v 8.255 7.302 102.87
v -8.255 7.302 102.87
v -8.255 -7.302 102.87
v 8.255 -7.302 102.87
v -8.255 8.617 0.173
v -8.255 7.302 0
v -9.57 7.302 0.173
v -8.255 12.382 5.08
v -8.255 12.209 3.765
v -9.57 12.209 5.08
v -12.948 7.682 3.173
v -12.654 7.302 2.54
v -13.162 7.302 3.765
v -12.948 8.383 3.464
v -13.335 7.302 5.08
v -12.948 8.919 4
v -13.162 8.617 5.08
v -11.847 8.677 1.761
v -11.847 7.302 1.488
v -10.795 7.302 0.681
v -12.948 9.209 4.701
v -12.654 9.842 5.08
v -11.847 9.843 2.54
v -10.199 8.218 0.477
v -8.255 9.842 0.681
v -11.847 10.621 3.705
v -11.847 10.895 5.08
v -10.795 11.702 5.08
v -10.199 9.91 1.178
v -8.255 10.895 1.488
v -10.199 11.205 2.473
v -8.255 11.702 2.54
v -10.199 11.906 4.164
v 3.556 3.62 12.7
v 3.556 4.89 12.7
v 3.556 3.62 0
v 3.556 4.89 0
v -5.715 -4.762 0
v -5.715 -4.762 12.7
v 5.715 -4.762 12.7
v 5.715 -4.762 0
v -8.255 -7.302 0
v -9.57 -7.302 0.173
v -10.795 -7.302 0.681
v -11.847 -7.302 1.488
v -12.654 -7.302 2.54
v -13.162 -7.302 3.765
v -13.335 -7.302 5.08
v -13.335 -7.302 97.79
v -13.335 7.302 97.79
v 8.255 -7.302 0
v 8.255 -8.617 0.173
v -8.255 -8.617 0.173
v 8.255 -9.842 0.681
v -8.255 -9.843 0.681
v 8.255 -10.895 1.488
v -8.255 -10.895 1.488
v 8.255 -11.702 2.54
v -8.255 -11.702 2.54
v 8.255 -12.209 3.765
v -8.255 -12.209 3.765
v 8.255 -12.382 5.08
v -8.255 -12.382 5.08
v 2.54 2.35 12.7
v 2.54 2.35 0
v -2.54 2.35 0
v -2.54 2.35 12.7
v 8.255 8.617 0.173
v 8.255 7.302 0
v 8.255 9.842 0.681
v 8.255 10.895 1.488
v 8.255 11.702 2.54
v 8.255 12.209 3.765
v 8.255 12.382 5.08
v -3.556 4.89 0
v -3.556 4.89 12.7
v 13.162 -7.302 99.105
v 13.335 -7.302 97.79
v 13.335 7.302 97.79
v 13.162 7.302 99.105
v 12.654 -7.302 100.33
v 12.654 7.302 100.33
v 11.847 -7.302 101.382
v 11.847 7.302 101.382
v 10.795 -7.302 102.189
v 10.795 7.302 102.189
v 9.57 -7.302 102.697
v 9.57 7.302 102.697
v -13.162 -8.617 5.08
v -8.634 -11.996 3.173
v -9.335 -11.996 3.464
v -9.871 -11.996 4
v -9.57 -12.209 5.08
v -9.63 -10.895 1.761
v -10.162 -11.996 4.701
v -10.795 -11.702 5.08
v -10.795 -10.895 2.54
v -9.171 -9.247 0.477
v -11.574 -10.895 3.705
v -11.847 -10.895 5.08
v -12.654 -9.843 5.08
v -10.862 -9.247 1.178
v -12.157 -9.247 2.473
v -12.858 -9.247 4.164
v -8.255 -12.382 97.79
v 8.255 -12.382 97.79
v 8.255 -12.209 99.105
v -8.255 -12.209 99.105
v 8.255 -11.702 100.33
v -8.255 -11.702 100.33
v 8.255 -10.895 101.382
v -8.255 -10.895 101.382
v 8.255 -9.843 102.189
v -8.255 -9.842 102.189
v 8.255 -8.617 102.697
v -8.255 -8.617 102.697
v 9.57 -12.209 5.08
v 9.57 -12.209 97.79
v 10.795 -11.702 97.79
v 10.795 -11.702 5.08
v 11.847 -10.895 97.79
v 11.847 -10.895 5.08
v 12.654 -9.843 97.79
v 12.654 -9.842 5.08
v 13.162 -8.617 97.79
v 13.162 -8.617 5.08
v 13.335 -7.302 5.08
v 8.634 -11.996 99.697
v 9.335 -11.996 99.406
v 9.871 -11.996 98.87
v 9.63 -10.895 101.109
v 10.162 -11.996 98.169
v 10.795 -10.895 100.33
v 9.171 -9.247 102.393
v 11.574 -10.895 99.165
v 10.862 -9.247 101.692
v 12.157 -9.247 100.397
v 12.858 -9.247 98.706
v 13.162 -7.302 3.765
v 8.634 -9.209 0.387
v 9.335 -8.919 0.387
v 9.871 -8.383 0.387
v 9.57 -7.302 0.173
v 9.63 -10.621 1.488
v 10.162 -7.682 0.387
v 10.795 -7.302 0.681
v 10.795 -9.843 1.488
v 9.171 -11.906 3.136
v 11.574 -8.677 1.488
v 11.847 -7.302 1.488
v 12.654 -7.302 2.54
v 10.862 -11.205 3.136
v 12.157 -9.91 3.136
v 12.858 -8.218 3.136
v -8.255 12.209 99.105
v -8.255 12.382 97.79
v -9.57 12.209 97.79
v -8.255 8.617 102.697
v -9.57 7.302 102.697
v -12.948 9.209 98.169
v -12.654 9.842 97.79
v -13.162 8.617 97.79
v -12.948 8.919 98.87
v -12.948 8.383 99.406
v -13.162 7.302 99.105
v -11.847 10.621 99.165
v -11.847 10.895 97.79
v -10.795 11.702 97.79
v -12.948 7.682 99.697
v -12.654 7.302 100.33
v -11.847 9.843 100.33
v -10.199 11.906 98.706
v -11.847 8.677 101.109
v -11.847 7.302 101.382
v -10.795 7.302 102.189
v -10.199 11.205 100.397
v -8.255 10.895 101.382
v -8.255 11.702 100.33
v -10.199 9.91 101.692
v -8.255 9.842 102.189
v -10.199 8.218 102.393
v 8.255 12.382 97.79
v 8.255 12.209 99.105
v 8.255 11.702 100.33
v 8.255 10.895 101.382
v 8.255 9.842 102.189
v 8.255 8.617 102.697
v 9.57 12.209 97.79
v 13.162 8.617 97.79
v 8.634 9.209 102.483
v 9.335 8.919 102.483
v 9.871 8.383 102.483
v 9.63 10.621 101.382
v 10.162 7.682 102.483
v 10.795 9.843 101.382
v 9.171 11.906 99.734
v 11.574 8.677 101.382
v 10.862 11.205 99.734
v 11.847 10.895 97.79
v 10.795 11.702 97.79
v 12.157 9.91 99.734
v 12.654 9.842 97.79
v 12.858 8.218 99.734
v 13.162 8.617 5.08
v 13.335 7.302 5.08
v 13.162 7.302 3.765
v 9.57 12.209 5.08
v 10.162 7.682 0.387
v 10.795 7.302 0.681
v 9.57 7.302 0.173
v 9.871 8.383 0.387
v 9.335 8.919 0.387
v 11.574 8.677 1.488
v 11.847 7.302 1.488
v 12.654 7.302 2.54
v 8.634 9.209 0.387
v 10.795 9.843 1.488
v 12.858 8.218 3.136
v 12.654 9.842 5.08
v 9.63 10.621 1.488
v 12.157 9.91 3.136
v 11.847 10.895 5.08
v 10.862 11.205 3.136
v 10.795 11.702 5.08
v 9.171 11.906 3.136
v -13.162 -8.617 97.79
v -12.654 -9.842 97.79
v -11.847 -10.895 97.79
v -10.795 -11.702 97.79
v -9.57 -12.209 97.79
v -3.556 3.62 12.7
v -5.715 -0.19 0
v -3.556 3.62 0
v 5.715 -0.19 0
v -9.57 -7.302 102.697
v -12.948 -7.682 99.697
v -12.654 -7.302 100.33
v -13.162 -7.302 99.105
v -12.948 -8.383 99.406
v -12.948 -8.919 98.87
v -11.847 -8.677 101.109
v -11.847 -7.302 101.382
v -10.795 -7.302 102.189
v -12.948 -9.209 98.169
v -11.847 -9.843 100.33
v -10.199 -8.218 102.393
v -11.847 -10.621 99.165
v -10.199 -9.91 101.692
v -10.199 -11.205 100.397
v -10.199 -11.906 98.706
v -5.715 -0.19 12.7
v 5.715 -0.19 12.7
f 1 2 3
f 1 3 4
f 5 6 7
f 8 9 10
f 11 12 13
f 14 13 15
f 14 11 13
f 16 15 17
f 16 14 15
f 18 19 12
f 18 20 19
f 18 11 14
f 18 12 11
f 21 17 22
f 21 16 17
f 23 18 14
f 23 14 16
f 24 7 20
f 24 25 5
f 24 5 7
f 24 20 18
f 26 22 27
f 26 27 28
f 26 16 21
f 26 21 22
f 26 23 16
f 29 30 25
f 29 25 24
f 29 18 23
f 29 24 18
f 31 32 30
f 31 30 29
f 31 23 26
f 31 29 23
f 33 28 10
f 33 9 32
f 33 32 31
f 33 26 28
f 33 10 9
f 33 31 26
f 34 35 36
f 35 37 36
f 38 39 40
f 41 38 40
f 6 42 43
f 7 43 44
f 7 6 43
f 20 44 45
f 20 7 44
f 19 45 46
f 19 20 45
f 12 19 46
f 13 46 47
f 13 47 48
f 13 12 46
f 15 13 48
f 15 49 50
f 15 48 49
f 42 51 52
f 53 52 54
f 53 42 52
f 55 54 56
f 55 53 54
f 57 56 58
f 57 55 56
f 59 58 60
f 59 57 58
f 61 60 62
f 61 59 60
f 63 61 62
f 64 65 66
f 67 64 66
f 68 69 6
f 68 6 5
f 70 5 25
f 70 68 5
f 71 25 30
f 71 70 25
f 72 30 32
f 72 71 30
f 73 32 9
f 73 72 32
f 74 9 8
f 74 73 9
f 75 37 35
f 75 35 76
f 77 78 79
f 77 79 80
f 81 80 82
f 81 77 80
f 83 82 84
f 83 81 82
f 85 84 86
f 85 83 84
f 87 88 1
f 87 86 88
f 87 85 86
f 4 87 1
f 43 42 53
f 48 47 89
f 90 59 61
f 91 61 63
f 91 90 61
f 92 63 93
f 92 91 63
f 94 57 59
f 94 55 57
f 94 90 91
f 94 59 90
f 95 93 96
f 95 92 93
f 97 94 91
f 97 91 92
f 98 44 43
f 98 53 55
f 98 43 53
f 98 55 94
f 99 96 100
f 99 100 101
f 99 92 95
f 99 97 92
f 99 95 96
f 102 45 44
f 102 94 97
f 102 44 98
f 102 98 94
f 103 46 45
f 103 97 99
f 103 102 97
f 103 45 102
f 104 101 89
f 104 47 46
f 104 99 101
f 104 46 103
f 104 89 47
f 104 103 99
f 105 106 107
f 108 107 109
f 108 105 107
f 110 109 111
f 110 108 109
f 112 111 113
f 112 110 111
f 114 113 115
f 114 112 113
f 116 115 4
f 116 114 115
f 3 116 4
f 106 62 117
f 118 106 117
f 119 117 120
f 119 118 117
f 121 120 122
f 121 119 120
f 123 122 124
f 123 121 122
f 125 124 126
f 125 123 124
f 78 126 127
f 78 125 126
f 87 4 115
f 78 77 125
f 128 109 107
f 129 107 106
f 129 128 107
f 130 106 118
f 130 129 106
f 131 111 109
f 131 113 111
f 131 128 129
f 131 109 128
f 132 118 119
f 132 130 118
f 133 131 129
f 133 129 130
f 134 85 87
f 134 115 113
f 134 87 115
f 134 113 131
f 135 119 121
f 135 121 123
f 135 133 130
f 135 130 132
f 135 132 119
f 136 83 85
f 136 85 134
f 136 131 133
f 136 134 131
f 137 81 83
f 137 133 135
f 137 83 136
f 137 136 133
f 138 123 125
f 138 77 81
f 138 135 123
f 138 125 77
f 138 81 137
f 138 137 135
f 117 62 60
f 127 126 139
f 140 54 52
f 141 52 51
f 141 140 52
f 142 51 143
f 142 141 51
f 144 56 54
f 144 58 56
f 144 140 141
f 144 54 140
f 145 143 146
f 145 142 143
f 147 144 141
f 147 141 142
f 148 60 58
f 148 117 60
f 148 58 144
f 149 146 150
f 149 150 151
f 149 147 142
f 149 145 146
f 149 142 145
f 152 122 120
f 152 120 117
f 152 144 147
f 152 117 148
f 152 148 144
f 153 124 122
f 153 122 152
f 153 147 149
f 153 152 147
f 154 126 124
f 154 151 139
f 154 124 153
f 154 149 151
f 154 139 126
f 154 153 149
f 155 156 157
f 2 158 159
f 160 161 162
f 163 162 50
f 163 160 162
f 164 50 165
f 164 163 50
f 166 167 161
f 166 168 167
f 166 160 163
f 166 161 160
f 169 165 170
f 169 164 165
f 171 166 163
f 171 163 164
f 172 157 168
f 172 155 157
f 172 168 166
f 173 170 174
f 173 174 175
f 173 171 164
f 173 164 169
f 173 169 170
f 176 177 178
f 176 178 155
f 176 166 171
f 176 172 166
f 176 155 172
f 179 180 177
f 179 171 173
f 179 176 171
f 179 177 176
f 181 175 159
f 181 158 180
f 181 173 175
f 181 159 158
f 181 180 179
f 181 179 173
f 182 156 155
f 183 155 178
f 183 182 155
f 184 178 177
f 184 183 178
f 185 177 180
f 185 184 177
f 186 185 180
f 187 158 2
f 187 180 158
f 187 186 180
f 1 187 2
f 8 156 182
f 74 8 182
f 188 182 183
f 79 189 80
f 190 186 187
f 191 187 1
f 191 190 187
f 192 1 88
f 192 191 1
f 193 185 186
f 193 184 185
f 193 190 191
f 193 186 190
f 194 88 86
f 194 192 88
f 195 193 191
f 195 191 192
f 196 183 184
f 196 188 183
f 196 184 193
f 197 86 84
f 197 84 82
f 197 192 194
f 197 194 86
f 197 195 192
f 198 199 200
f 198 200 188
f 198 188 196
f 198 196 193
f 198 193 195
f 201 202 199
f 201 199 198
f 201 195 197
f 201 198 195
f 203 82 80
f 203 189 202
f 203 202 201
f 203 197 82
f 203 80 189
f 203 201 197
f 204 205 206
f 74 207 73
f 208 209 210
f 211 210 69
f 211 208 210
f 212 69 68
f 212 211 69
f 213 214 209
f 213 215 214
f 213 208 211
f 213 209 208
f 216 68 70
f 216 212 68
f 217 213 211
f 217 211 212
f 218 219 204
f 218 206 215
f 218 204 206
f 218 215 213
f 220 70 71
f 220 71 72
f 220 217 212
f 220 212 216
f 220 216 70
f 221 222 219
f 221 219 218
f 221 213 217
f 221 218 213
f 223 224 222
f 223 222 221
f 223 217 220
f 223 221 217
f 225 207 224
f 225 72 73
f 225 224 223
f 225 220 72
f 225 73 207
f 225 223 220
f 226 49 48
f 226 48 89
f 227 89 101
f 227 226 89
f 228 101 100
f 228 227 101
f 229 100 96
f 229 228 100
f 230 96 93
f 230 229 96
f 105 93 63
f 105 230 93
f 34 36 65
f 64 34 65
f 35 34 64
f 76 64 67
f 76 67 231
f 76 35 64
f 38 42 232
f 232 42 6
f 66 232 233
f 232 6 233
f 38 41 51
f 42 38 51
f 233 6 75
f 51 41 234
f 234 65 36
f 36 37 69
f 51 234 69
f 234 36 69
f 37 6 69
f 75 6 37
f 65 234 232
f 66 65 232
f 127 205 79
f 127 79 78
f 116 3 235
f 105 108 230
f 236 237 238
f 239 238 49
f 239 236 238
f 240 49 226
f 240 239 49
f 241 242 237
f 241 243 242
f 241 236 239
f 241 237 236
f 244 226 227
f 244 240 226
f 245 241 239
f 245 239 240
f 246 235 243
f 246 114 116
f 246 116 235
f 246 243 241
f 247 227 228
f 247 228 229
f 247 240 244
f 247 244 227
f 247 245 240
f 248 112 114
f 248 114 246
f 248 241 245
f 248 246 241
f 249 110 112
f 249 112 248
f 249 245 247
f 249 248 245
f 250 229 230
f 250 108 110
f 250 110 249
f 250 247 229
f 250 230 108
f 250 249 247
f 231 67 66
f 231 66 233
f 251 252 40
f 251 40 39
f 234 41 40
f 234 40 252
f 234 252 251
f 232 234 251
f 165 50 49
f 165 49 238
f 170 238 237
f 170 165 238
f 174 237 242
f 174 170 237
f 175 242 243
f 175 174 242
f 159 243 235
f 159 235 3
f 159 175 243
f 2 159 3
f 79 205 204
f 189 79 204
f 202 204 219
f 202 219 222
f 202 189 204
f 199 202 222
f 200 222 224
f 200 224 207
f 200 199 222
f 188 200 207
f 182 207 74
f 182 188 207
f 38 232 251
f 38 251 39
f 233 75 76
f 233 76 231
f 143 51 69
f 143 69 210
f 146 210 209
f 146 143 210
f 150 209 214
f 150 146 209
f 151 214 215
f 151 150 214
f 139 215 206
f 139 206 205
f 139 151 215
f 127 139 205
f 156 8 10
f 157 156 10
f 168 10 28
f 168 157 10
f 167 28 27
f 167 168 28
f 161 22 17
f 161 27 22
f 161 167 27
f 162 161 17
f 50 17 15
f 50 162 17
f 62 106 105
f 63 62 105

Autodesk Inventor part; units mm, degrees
ref_plane "YZ Plane" through (0, 0, 0) normal (1, 0, 0) x (0, 1, 0)
ref_plane "XZ Plane" through (0, 0, 0) normal (0, 1, 0) x (-1, 0, 0)
ref_plane "XY Plane" through (0, 0, 0) normal (0, 0, 1) x (1, 0, 0)
sketch "Sketch1" plane through (0, 0, 0) normal (0, 0, 1) x (1, 0, 0)
  line L0 (-13.335, 12.3825) -> (13.335, 12.3825)
  line L1 (13.335, 12.3825) -> (13.335, -12.3825)
  line L2 (13.335, -12.3825) -> (-13.335, -12.3825)
  line L3 (-13.335, -12.3825) -> (-13.335, 12.3825)
  line L4 (-13.335, 12.3825) -> (13.335, -12.3825) construction
  line L5 (13.335, 12.3825) -> (-13.335, -12.3825) construction
  point P0 (0, 0)
  dimension "d0" = 26.67
  dimension "d1" = 24.765
extrude "Extrusion1" add sketch "Sketch1" along normal blind 102.87
fillet "Fillet1" radius 5.08 12 edges at (13.335, 12.3825, 51.435) (13.335, 0, 102.87) (0, 12.3825, 102.87) (0, -12.3825, 102.87) (13.335, -12.3825, 51.435) (-13.335, 0, 102.87) (13.335, 0, 0) (0, 12.3825, 0) (-13.335, 0, 0) (0, -12.3825, 0) (-13.335, 12.3825, 51.435) (-13.335, -12.3825, 51.435)
sketch "Sketch2" plane through (0, 0, 0) normal (0, 0, -1) x (-1, 0, 0)
  line L0 (-5.715, -0.1905) -> (5.715, -0.1905)
  line L1 (5.715, -0.1905) -> (5.715, -4.7625)
  line L2 (5.715, -4.7625) -> (-5.715, -4.7625)
  line L3 (-5.715, -4.7625) -> (-5.715, -0.1905)
  line L4 (-8.255, -12.3825) -> (8.255, -12.3825) projected
  line L5 (-8.255, 12.3825) -> (8.255, 12.3825) construction
  line L6 (0, 12.3825) -> (0, -12.3825) construction
  line L7 (-3.556, 4.8895) -> (3.556, 4.8895)
  line L8 (3.556, 4.8895) -> (3.556, 3.6195)
  line L9 (-3.556, 4.8895) -> (-3.556, 3.6195)
  line L10 (-2.54, 2.3495) -> (2.54, 2.3495)
  line L11 (2.54, 2.3495) -> (3.556, 3.6195)
  line L12 (-3.556, 3.6195) -> (-2.54, 2.3495)
  point P0 (0, 0)
  dimension "d5" = 11.43
  dimension "d6" = 4.572
  dimension "d7" = 7.62
  dimension "d8" = 5.715
  dimension "d9" = 7.112
  dimension "d10" = 1.27
  dimension "d11" = 1.27
  dimension "d12" = 5.08
  dimension "d13" = 2.54
  dimension "d14" = 1.016
  dimension "d15" = 3.556
  dimension "d16" = 2.54
extrude "Extrusion2" cut sketch "Sketch2" against normal blind 12.7
equation "\"d8\" = 0.5 * d5"
equation "\"d15\" = 0.5 * d9"
properties part number "5V_LIon"
